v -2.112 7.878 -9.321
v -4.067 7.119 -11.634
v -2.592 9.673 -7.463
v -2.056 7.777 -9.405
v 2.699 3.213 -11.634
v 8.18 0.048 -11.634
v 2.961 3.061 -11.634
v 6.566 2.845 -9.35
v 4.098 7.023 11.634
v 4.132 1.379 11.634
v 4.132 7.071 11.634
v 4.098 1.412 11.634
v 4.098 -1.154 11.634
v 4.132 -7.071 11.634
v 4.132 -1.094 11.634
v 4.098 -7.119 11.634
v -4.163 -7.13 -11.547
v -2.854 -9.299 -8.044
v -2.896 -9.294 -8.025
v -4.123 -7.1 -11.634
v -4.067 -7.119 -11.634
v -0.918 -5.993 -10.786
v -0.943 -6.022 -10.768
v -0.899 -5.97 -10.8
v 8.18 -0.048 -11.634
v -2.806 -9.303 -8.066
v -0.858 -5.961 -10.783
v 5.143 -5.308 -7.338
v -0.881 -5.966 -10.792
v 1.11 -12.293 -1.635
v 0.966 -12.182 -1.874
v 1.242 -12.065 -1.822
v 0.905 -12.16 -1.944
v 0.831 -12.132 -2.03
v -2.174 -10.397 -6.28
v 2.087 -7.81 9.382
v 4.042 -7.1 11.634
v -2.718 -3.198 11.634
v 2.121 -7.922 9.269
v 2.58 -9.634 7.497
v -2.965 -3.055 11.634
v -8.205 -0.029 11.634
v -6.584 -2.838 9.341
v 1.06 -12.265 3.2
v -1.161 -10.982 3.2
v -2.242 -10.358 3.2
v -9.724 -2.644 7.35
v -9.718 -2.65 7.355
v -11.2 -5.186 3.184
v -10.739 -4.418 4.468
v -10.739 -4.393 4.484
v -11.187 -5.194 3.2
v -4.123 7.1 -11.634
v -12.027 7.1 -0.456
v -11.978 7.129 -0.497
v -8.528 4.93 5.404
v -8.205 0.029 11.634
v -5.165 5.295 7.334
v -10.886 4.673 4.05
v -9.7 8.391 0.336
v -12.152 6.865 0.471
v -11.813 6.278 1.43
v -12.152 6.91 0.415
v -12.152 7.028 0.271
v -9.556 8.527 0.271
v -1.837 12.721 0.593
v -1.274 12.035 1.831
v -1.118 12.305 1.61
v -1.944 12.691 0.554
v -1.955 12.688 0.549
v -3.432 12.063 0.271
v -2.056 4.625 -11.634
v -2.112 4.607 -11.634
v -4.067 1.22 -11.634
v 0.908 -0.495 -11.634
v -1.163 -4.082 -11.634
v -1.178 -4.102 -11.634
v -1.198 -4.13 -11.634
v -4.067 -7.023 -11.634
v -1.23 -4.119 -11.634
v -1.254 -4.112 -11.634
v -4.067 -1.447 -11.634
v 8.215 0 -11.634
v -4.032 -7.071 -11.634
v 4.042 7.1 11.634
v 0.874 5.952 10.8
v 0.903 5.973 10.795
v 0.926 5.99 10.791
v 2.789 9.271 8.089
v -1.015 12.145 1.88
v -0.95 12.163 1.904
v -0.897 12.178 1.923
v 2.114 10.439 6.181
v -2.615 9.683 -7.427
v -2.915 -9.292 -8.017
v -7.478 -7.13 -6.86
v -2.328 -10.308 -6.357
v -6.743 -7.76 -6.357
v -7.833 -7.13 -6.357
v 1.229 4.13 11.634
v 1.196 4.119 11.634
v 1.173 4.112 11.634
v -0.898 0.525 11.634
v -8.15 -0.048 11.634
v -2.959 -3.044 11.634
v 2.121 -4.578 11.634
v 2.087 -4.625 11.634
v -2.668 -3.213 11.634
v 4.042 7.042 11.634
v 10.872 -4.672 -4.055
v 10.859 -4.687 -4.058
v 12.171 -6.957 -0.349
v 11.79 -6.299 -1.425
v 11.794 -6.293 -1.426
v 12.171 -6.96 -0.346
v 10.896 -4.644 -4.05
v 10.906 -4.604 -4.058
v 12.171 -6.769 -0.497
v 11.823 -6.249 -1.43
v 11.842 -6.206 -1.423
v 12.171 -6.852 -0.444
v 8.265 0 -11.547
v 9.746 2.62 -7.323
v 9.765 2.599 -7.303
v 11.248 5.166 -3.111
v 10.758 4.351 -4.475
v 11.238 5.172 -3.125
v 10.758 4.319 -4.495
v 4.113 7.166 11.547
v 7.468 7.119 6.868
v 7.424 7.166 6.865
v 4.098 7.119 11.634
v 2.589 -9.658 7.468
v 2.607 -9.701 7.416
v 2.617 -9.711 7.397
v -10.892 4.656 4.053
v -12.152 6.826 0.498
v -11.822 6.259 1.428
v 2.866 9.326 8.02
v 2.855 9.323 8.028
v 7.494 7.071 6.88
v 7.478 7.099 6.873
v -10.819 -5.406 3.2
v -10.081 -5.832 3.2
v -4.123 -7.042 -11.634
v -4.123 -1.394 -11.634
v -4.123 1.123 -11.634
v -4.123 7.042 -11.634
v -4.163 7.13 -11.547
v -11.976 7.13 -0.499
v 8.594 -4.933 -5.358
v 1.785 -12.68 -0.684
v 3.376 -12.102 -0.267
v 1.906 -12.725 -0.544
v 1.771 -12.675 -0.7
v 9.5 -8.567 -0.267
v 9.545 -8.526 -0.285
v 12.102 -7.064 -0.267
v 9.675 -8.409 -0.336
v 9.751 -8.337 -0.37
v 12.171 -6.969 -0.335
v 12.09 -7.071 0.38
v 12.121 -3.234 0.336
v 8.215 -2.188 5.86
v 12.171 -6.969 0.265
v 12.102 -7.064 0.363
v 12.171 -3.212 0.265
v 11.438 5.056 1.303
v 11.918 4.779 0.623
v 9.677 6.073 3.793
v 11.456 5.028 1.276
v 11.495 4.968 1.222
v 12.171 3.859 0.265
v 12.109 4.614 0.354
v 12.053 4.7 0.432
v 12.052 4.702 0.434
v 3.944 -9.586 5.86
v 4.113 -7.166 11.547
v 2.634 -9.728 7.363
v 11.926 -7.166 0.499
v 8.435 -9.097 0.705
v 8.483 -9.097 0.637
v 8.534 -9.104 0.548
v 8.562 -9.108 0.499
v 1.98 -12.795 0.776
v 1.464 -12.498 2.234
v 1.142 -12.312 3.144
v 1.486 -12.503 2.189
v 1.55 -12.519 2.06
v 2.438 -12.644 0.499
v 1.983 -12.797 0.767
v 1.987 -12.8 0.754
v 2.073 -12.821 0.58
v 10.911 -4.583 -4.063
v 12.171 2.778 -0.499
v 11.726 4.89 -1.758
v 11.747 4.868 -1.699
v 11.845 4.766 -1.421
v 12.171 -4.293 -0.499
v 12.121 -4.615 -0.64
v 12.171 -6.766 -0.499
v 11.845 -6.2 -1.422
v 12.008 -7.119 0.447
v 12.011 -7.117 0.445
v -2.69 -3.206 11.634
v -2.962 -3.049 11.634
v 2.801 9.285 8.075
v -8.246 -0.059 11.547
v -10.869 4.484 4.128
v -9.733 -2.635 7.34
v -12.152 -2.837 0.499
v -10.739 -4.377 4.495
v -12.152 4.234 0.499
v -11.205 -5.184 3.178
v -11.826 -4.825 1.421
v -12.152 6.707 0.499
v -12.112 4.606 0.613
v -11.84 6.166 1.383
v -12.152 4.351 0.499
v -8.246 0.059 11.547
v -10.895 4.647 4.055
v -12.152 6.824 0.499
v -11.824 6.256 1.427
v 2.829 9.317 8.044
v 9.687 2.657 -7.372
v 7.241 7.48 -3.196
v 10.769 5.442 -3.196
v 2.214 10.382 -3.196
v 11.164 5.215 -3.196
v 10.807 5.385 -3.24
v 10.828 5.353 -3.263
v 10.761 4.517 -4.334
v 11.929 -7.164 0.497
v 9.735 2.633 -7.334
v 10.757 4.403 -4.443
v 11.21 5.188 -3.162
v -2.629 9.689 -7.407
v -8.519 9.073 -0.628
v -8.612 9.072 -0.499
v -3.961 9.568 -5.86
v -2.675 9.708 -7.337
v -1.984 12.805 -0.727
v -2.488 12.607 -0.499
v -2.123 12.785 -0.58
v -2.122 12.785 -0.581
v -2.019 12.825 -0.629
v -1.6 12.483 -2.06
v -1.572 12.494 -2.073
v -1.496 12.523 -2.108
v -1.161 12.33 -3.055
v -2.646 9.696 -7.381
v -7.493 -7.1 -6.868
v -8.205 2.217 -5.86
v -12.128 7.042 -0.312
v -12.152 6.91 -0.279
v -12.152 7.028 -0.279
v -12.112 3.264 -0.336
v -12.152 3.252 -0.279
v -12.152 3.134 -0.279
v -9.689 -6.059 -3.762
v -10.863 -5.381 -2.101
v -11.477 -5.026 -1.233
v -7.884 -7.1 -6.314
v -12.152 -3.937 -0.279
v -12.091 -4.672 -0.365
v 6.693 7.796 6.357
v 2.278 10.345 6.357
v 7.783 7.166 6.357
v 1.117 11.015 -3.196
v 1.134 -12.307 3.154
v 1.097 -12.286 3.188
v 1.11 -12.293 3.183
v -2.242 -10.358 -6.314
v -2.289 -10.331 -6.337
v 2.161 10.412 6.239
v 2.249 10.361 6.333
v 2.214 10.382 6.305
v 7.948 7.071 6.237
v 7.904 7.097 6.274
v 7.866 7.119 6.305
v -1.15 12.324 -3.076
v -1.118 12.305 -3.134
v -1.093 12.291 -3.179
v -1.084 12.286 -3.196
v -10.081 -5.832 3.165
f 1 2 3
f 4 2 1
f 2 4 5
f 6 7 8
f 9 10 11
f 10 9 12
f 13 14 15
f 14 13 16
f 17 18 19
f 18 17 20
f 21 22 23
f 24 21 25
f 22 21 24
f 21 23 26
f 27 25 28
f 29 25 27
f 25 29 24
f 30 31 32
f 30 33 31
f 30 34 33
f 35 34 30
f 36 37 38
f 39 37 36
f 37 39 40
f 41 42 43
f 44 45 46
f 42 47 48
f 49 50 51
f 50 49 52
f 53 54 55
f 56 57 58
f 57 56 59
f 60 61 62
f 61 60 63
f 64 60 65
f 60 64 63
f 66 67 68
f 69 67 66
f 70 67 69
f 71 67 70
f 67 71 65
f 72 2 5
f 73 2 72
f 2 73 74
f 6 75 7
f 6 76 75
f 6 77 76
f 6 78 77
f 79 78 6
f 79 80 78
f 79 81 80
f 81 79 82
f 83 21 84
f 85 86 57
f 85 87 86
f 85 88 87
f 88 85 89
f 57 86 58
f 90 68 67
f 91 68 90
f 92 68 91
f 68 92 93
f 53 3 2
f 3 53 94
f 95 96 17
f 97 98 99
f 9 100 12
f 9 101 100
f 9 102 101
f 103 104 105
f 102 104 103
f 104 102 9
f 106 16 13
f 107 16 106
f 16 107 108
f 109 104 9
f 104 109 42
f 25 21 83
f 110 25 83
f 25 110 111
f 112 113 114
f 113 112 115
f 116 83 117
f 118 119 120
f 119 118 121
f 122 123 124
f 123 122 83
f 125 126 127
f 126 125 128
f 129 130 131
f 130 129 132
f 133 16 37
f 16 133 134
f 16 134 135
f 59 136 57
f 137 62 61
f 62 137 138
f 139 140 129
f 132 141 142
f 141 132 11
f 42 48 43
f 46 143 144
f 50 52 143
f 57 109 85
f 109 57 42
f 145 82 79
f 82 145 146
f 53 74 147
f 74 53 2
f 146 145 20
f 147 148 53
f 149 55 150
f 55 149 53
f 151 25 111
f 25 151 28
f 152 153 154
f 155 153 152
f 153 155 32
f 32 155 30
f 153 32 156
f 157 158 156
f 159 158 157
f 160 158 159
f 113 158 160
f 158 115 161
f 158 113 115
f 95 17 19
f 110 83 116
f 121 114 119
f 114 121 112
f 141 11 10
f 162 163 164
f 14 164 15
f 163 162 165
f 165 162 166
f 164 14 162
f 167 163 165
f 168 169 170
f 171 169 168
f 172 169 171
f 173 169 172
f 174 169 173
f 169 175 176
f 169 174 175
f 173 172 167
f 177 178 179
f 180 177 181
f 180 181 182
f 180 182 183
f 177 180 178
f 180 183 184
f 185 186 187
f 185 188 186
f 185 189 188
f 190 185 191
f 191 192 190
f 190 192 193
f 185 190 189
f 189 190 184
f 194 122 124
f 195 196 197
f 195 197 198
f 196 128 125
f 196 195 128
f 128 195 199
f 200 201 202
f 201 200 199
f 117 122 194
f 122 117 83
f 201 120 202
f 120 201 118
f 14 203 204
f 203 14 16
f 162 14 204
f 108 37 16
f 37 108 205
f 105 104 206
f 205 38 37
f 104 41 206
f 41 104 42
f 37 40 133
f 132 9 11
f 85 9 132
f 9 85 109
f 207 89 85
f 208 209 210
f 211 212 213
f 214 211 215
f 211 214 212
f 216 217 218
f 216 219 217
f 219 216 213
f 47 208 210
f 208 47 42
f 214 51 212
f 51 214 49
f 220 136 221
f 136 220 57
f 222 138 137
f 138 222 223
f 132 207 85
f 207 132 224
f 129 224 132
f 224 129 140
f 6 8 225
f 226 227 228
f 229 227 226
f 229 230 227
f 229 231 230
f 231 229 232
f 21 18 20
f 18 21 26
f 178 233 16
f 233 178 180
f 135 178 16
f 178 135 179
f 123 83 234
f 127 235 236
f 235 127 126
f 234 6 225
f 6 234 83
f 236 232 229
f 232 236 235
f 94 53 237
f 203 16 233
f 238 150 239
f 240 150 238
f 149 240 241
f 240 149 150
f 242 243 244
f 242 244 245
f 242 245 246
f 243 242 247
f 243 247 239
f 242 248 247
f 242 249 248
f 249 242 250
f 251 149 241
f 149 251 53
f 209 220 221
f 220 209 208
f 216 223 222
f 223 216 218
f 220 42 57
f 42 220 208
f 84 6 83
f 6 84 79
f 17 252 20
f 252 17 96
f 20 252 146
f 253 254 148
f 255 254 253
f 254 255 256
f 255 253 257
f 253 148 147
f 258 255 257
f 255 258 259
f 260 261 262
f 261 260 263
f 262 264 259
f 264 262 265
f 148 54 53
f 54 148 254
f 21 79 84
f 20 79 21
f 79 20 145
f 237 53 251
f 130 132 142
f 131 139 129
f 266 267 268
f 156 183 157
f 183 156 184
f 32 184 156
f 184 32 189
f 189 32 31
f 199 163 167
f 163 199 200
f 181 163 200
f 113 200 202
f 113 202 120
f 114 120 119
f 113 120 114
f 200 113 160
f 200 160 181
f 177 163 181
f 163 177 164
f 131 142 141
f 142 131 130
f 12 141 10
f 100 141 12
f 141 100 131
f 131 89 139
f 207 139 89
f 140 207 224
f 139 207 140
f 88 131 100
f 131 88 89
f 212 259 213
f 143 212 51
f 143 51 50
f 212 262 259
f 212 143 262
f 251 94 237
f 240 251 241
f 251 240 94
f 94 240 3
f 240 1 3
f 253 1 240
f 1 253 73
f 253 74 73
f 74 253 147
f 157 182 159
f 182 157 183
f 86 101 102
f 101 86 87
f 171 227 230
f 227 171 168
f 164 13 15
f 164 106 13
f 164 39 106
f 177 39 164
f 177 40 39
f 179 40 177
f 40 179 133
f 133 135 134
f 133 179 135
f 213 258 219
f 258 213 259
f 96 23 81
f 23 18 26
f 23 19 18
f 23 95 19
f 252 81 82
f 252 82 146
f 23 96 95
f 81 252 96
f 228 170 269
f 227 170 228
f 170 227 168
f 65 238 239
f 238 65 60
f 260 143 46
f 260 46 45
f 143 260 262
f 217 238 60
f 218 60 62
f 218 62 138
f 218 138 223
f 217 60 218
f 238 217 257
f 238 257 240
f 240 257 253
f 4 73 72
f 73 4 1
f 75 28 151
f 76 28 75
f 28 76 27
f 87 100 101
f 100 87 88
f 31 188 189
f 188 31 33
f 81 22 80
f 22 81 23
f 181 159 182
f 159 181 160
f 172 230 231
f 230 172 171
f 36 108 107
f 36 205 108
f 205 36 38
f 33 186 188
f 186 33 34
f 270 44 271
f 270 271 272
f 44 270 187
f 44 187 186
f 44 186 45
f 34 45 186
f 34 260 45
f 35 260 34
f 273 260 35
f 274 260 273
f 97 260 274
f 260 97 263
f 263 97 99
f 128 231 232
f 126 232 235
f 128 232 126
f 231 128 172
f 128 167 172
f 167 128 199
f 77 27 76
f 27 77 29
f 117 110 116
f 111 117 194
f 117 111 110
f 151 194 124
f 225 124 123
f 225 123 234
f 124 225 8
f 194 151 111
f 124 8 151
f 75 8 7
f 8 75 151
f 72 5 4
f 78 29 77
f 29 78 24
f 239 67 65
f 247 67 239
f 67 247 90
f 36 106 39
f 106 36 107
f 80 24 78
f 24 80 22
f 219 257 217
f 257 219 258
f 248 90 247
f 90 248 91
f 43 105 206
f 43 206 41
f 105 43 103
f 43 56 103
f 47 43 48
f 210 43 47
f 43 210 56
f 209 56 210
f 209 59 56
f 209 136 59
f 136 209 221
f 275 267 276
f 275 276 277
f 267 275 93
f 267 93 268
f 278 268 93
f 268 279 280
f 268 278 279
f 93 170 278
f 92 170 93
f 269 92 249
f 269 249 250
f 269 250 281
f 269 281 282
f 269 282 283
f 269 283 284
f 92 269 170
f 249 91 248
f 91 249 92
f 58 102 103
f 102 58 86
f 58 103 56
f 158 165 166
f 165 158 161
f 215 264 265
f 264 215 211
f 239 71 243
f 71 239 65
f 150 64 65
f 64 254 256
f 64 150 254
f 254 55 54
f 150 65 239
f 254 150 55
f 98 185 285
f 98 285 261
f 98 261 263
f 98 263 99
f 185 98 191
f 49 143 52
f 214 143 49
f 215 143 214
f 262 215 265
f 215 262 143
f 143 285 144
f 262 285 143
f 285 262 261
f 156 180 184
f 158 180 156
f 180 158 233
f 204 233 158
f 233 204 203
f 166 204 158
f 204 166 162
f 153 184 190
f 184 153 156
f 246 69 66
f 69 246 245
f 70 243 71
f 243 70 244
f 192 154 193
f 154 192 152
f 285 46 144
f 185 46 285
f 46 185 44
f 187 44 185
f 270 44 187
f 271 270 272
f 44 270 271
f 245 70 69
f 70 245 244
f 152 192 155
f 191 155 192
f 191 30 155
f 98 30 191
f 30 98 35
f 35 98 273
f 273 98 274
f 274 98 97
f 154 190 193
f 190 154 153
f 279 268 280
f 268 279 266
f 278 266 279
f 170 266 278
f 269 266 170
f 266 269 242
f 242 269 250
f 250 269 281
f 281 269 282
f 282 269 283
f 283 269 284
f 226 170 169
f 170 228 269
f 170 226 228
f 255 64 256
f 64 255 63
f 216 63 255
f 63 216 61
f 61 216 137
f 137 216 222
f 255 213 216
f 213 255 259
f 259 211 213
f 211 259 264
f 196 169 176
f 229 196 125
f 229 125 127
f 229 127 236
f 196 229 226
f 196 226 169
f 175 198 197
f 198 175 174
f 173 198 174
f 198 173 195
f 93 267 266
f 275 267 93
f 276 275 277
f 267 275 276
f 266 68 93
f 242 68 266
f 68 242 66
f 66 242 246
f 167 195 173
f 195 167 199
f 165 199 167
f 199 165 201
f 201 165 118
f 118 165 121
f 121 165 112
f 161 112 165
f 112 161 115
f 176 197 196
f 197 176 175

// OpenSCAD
// Auto-generated OpenSCAD file

    inner_points = 10*[[0.20710693988208648, -0.11957288099850123, 1.3938468501174708], [-1.2071077061074778, 0.696921823046418, 0.2391463117374062], [1.2071077061074778, -0.696921823046412, -0.2391463117374062], [-0.2071069398820867, 0.11957288099850712, -1.3938468501174708], [0.20710847234179258, -1.2742734193816845, 0.5773502691967429], [-1.2071061736477717, -0.45777871533676523, -0.5773502691833217], [1.2071061736477717, 0.4577787153367711, 0.5773502691833217], [-0.2071084723417928, 1.2742734193816903, -0.5773502691967429], [-0.9999992337656851, -0.5773515963352692, 0.8164965809341491], [1.5324597058593505e-06, -1.15470053838318, -0.8164965809207279], [-1.5324597060731924e-06, 1.1547005383831859, 0.8164965809207279], [0.9999992337656849, 0.5773515963352752, -0.8164965809341491]];

    outer_points = 10*[[-0.40824748125735855, -0.7071051557654474, -1.1547018198378944], [1.2247458098265853, -0.7071051557654474, -1.4642153502997246e-06], [-1.2247458098265853, 0.7071051557654474, 1.4642153502997246e-06], [0.40824748125735855, 0.7071051557654474, 1.1547018198378944], [-1.2247439329544203, -0.7071084066039113, -1.1900833506439668e-06], [0.4082493581295237, -0.7071084066039113, 1.1546991655391934], [-0.4082493581295237, 0.7071084066039113, -1.1546991655391934], [1.2247439329544203, 0.7071084066039113, 1.1900833506439668e-06], [1.876872165147656e-06, -1.4142135623693588, -2.654298700943848e-06], [-0.8164964516970618, -3.250838463864092e-06, 1.154700629754544], [0.8164964516970618, 3.250838463864092e-06, -1.154700629754544], [-1.876872165147656e-06, 1.4142135623693588, 2.654298700943848e-06]];

    // Convex hull for inner set (I)
    module inner_hull() {
        hull() {
            for (p = inner_points) {
                translate(p) sphere(r=0.1);
            }
        }
    }

    // Convex hull for outer set (O) minus inner hull (O \ I)
    module outer_minus_inner() {
        difference() {
            hull() {
                for (p = outer_points) {
                    translate(p) sphere(r=0.1);
                }
            }
            inner_hull(); // Subtract inner hull
        }
    }

    // Convex hull for outer set (O) minus all translated inner hulls
    module outer_minus_AllTranslationInner() {
        difference() {
            hull() {
                for (p = outer_points) {
                    translate(p) sphere(r=0.1);
                }
            }
            hull() {
                translate([0,0,5]) inner_hull();
                translate([0,0,-5]) inner_hull();
            }; // Subtract translated inner hulls
        }
    }

    // Difference between outer_minus_inner and outer_minus_AllTranslationInner
    module outer_minus_inner_diff() {
        difference() {
            // Outer minus inner
            difference() {
                hull() {
                    for (p = outer_points) {
                        translate(p) sphere(r=0.1);
                    }
                }
                inner_hull();
            }

            // Subtract Outer minus AllTranslationInner
            difference() {
                hull() {
                    for (p = outer_points) {
                        translate(p) sphere(r=0.1);
                    }
                }
                hull() {
                    translate([0,0,5]) inner_hull();
                    translate([0,0,-5]) inner_hull();
                };
            }
        }
    }

    // Rendering all with colors applied
    // color([1, 0, 0, 0.5]) inner_hull(); // Transparent red
    // color([0, 1, 0, 1]) outer_minus_AllTranslationInner(); // Opaque green
    color([1, 1, 0, 1]) outer_minus_inner_diff(); // Opaque yellow
    
